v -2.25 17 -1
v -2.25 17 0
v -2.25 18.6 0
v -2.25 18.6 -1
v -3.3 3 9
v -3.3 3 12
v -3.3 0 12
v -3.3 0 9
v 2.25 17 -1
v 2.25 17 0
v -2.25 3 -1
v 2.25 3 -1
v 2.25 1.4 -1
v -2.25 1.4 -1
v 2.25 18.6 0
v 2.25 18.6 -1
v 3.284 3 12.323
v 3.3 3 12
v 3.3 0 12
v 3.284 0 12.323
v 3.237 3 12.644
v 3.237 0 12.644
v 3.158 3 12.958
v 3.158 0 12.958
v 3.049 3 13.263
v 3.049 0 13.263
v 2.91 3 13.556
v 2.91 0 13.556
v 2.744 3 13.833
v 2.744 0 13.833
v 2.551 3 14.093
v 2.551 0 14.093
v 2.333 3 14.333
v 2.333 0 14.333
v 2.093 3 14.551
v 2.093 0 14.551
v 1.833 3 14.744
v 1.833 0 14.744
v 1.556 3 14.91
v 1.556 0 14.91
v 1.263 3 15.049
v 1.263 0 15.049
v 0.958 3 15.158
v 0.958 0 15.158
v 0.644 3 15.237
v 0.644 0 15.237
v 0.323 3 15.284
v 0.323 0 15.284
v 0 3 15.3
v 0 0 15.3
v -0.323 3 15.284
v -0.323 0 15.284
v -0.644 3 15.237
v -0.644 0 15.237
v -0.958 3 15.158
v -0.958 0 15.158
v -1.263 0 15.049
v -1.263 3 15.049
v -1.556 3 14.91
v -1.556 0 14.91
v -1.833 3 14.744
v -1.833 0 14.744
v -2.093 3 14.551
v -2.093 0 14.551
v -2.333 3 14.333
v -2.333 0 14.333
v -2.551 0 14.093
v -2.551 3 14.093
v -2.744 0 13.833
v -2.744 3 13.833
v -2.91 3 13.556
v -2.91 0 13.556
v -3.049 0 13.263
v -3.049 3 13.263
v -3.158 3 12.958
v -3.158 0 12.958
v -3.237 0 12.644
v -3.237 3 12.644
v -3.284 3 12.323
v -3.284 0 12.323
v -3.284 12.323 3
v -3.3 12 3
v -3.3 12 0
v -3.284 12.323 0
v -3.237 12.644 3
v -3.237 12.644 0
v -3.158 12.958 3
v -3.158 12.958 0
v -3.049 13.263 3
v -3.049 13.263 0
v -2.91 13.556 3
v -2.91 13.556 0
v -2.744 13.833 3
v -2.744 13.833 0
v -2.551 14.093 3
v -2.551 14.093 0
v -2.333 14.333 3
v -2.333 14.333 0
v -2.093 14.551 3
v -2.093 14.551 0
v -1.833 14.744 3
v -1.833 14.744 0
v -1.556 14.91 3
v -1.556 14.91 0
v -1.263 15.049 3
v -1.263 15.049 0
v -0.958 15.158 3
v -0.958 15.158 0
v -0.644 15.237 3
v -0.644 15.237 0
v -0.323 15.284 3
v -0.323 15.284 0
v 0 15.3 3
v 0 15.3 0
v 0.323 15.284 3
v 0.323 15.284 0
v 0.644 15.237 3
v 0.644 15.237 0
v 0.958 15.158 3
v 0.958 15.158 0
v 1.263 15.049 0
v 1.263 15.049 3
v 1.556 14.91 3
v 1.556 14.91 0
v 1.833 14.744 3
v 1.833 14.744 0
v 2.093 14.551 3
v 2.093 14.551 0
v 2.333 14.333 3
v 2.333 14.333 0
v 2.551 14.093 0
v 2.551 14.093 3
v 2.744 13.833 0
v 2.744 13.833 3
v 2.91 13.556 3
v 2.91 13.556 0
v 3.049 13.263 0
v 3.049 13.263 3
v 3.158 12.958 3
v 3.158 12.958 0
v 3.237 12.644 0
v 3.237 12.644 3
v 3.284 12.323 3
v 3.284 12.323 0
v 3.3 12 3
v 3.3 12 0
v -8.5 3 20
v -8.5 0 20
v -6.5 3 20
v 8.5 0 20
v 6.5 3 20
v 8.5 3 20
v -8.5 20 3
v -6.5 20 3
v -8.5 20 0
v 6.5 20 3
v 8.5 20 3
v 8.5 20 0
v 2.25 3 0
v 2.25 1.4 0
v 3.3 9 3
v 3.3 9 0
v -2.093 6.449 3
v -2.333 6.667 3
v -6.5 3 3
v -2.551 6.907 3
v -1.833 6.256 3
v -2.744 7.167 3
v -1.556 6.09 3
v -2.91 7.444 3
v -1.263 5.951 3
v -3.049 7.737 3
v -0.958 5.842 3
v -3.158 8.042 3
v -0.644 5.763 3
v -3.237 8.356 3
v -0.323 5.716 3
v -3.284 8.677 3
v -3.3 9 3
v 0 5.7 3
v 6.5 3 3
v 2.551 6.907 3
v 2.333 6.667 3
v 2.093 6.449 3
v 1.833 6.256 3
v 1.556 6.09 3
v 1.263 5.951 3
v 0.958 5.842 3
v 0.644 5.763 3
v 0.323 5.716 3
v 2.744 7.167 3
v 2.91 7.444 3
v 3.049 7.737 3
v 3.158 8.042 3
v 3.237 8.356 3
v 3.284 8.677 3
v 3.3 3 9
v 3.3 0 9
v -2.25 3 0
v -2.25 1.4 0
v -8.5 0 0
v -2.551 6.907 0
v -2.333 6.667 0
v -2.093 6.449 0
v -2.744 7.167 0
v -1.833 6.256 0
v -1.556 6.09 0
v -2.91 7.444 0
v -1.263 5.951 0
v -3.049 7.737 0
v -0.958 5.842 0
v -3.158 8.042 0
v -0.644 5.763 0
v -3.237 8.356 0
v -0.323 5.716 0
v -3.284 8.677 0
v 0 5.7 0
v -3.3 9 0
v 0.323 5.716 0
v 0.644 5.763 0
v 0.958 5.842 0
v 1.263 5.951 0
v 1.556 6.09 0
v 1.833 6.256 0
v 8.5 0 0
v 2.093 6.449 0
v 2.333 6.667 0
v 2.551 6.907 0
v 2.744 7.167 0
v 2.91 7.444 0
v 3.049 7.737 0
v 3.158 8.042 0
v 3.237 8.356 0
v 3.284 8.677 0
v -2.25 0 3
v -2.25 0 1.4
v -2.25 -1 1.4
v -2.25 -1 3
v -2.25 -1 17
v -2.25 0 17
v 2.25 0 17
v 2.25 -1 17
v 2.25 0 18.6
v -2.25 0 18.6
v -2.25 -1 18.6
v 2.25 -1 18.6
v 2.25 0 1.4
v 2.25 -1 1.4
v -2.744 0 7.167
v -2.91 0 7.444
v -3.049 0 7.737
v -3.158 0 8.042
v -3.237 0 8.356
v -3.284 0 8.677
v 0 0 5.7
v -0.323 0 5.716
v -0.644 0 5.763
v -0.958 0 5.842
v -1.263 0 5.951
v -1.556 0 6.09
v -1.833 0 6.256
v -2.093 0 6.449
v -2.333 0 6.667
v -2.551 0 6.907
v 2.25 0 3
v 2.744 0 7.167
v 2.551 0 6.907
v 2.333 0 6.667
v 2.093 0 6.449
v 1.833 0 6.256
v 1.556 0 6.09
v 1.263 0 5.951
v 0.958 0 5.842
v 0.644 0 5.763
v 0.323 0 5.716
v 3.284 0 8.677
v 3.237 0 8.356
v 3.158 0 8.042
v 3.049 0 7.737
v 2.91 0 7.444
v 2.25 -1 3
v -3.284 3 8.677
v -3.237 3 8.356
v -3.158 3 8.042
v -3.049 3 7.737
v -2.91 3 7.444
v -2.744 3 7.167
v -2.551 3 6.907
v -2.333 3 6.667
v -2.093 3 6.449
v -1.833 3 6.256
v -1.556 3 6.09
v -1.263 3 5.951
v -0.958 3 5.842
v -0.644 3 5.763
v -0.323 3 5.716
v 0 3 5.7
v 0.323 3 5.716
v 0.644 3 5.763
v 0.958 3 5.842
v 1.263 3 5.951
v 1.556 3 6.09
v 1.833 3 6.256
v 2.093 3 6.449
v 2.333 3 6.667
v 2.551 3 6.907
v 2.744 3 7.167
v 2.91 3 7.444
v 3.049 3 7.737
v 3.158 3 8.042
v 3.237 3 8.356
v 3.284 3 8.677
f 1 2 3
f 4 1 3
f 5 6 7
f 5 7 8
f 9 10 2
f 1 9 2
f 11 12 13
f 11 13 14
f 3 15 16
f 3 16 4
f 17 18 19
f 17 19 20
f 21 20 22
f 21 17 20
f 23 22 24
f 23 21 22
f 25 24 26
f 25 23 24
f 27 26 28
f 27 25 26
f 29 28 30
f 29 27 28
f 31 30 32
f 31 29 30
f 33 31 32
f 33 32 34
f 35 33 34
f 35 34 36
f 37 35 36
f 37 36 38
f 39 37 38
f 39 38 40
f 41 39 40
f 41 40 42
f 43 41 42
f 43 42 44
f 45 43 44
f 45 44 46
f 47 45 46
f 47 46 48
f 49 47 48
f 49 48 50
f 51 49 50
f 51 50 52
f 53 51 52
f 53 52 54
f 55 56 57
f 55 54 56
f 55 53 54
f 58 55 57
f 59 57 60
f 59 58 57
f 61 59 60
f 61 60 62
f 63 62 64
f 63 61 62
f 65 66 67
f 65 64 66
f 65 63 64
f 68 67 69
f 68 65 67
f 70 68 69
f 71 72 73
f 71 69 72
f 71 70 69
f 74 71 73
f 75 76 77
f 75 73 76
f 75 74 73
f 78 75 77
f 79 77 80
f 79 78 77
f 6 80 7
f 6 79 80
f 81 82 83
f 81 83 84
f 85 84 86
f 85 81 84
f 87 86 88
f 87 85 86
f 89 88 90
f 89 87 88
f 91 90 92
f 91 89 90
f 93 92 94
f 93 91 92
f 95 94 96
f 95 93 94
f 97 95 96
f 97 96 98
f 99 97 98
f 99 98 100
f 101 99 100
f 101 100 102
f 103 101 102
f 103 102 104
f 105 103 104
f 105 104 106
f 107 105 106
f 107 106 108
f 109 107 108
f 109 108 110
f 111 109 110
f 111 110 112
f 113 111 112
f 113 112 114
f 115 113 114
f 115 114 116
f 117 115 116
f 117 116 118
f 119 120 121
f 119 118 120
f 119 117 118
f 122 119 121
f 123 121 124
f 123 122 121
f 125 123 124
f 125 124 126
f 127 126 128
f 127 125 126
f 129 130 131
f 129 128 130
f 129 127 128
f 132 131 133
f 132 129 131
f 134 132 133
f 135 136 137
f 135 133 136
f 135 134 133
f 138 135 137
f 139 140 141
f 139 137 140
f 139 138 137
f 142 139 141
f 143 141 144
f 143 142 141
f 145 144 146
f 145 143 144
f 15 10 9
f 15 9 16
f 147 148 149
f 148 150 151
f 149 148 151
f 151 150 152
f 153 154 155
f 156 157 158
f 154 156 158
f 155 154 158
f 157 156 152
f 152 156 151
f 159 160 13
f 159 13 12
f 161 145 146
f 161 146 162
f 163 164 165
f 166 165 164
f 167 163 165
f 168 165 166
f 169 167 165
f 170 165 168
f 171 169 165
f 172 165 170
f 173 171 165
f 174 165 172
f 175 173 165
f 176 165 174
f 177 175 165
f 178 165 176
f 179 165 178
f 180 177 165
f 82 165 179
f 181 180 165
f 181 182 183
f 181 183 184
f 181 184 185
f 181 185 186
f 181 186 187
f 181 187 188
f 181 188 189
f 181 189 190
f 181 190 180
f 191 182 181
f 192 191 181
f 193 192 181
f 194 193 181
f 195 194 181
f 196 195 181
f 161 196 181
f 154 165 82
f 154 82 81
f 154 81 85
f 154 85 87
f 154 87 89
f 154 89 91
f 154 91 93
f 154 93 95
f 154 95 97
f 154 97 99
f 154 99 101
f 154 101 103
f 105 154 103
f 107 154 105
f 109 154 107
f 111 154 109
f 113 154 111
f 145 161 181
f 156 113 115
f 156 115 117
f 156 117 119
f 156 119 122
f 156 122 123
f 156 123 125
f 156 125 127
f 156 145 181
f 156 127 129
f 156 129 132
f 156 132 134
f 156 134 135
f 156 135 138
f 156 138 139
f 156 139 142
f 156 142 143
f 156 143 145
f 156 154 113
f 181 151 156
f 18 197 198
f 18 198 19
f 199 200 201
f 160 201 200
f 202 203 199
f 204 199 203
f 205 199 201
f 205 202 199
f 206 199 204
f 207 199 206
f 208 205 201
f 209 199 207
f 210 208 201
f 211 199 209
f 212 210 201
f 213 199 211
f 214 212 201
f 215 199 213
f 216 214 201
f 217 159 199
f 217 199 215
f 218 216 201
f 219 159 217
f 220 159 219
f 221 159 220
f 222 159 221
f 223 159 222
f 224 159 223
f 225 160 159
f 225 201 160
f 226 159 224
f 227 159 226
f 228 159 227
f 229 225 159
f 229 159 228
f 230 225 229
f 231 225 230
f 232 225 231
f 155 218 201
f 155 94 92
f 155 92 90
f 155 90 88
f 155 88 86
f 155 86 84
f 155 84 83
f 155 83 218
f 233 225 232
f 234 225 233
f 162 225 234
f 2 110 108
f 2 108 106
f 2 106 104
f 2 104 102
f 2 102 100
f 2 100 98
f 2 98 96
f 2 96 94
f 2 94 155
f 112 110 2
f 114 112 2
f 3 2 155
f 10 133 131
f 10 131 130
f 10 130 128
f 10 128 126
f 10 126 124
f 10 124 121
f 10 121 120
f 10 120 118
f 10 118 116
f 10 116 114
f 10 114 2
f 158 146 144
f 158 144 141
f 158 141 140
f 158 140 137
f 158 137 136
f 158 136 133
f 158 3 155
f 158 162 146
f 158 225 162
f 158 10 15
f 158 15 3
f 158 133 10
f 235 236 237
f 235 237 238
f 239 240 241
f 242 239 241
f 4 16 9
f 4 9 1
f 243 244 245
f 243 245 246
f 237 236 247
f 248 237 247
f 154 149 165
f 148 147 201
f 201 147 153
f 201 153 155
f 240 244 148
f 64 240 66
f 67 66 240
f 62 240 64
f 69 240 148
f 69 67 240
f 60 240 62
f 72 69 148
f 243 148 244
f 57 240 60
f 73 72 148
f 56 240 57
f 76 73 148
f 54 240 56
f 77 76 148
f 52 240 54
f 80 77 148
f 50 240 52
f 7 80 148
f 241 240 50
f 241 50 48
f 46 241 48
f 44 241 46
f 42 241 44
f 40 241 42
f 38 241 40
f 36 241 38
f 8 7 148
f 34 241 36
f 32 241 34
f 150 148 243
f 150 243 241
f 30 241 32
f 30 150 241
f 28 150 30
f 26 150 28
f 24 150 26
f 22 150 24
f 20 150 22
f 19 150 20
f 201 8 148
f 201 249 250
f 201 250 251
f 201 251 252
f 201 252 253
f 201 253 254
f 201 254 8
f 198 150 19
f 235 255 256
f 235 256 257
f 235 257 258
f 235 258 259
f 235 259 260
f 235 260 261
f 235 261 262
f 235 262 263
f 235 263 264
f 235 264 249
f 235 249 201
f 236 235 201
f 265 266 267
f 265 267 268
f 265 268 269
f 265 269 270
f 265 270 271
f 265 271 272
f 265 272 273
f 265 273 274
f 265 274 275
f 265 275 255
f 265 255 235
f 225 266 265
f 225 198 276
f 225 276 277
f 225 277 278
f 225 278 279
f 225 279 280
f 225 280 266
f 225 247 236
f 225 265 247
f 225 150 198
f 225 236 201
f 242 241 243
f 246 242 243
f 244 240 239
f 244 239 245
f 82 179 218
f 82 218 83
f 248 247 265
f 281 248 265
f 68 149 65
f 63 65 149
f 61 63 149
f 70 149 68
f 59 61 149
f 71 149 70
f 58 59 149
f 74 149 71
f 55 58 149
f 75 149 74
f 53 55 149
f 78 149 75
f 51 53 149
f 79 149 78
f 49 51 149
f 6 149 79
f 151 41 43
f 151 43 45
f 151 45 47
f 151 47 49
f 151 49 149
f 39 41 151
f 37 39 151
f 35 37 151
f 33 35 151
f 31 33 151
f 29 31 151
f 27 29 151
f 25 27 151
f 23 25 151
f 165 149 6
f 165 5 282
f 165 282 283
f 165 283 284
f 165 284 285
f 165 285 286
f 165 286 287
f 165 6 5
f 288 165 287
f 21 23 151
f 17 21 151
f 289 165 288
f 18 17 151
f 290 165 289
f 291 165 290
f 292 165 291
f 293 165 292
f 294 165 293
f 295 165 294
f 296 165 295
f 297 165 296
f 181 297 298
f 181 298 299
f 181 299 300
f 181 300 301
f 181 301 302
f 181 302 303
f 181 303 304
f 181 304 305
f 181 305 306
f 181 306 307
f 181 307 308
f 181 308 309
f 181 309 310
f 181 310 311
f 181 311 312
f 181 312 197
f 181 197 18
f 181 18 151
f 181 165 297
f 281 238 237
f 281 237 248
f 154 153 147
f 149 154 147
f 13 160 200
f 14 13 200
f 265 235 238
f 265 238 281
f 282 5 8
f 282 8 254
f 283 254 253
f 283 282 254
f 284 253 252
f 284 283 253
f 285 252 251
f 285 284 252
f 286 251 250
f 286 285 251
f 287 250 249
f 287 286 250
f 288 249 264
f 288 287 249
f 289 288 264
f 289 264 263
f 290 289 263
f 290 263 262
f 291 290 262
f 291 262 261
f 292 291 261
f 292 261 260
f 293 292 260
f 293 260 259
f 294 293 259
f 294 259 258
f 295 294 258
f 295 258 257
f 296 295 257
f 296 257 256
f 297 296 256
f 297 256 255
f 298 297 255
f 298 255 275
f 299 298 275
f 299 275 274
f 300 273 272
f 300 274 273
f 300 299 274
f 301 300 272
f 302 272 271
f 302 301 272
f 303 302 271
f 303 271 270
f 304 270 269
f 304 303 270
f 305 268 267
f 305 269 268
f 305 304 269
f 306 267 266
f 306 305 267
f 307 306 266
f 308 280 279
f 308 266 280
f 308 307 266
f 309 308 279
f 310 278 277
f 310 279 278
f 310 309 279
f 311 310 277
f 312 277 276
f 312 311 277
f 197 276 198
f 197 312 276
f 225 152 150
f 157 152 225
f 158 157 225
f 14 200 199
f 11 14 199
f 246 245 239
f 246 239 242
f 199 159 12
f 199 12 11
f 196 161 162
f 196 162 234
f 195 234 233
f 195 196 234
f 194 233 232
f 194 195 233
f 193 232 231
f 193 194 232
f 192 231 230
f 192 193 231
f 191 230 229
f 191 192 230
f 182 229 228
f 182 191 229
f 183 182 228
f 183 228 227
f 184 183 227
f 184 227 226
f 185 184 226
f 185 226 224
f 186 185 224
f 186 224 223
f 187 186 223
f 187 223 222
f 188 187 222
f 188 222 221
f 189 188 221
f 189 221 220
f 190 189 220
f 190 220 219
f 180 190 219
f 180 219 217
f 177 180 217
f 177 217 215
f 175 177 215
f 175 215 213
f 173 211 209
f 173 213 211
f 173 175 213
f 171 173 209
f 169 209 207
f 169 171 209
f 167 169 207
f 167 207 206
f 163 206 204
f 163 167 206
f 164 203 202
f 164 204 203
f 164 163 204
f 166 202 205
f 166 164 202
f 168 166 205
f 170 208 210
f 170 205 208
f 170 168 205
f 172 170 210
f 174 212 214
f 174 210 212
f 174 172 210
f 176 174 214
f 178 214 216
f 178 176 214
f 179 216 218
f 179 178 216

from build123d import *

# Parameters (mm, degrees)
SKETCH1_W           = 20
SKETCH1_H           = 20
BOSS_EXTRUDE1_DEPTH = 8.5
CUT_EXTRUDE1_DEPTH  = 34
SKETCH3_W           = 13
SKETCH3_H           = 17
CUT_EXTRUDE2_DEPTH  = 17
CUT_EXTRUDE4_DEPTH  = 28.590759323
CUT_EXTRUDE5_DEPTH  = 28.590759323
SKETCH7_W           = 4.5
SKETCH7_H           = 1.6
BOSS_EXTRUDE2_DEPTH = 1
SKETCH8_W           = 4.5
SKETCH8_H           = 1.6
BOSS_EXTRUDE3_DEPTH = 1


with BuildPart() as part:
    # Sketch1 → Boss-Extrude1 (new, symmetric)
    with BuildSketch(Plane(origin=(0, 0, 0), x_dir=(0, 0, -1), z_dir=(1, 0, 0))):
        with Locations((-10, 10)):
            Rectangle(SKETCH1_W, SKETCH1_H)
    extrude(amount=BOSS_EXTRUDE1_DEPTH, both=True)

    # Sketch2 → Cut-Extrude1 (cut, through all)
    with BuildSketch(Plane.ZY.offset(8.5)):
        Polygon((20, 20), (3, 20), (20, 3), align=None)
    extrude(amount=-CUT_EXTRUDE1_DEPTH, mode=Mode.SUBTRACT)

    # Sketch3 → Cut-Extrude2 (cut)
    with BuildSketch(Plane(origin=(0, 20, 0), x_dir=(1, 0, 0), z_dir=(0, 1, 0))):
        with Locations((0, -11.5)):
            Rectangle(SKETCH3_W, SKETCH3_H)
    extrude(amount=-CUT_EXTRUDE2_DEPTH, mode=Mode.SUBTRACT)

    # Sketch5 → Cut-Extrude4 (cut, through all)
    with BuildSketch(Plane.XY.offset(3)):
        with BuildLine():
            Line((-3.3, 9), (-3.3, 12))
            ThreePointArc((-3.3, 12), (0, 15.3), (3.3, 12))
            Line((3.3, 12), (3.3, 9))
            ThreePointArc((3.3, 9), (0, 5.7), (-3.3, 9))
        make_face()
    extrude(amount=-CUT_EXTRUDE4_DEPTH, mode=Mode.SUBTRACT)

    # Sketch6 → Cut-Extrude5 (cut, through all)
    with BuildSketch(Plane(origin=(0, 3, 0), x_dir=(1, 0, 0), z_dir=(0, 1, 0))):
        with BuildLine():
            Line((3.3, -9), (3.3, -12))
            ThreePointArc((3.3, -12), (0, -15.3), (-3.3, -12))
            Line((-3.3, -12), (-3.3, -9))
            ThreePointArc((-3.3, -9), (0, -5.7), (3.3, -9))
        make_face()
    extrude(amount=-CUT_EXTRUDE5_DEPTH, mode=Mode.SUBTRACT)

    # Sketch7 → Boss-Extrude2 (add)
    with BuildSketch(Plane(origin=(0, 0, 0), x_dir=(-1, 0, 0), z_dir=(0, 0, -1))):
        with Locations((0, 17.8)):
            Rectangle(SKETCH7_W, SKETCH7_H)
        with Locations((0, 2.2)):
            Rectangle(SKETCH7_W, SKETCH7_H)
    extrude(amount=BOSS_EXTRUDE2_DEPTH)

    # Sketch8 → Boss-Extrude3 (add)
    with BuildSketch(Plane.XZ):
        with Locations((0, 17.8)):
            Rectangle(SKETCH8_W, SKETCH8_H)
        with Locations((0, 2.2)):
            Rectangle(SKETCH8_W, SKETCH8_H)
    extrude(amount=BOSS_EXTRUDE3_DEPTH)


solid = part.part
